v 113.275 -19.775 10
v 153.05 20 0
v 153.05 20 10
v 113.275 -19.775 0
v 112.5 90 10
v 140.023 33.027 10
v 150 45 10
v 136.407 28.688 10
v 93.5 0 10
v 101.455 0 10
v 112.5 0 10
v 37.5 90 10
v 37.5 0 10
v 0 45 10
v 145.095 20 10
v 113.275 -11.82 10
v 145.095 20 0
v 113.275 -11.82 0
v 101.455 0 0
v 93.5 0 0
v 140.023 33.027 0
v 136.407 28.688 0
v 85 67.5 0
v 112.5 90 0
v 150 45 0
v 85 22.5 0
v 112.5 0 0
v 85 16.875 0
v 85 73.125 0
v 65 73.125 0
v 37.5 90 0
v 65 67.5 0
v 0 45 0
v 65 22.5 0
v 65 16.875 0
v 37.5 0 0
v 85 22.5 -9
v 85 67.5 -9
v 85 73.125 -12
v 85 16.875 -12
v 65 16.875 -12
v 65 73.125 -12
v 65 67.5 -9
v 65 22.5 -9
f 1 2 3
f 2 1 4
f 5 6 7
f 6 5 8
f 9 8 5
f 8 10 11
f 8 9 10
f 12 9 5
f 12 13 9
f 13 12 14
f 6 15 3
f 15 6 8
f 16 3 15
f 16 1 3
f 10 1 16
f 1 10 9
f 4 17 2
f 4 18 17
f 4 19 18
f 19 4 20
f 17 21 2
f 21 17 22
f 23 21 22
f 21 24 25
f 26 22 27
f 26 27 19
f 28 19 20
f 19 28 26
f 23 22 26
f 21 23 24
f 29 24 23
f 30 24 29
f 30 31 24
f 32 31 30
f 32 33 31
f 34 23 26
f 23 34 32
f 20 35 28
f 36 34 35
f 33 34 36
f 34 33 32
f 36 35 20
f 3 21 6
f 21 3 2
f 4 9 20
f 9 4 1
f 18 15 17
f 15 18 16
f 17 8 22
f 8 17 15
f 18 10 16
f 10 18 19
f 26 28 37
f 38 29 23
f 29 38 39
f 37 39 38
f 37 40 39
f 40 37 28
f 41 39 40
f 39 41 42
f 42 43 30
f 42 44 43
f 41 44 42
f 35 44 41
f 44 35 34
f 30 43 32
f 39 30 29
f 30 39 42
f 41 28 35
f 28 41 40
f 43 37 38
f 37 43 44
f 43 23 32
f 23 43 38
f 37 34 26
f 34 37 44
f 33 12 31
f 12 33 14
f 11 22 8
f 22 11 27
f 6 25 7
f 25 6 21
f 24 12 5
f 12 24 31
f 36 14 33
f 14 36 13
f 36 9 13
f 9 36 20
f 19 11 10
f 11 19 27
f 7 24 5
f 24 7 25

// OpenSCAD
BELT_LOOP_OPENING = 45;
BUCKLE_LENGTH = 150;
BUCKLE_WIDTH = 90;
BUCKLE_DEPTH = 10;


// Uncomment the part you want to render:
//buckle_front();
buckle_back();
//belt_hole_post();


// buckles
module buckle_front(){
    difference(){
        color("silver"){
            union(){
                // base
                linear_extrude(BUCKLE_DEPTH){
                    polygon(points=[
                        [0,BUCKLE_WIDTH/2],
                        [BUCKLE_LENGTH/4,BUCKLE_WIDTH],
                        [BUCKLE_LENGTH-(BUCKLE_LENGTH/4),BUCKLE_WIDTH],
                        [BUCKLE_LENGTH,BUCKLE_WIDTH/2],
                        [BUCKLE_LENGTH-(BUCKLE_LENGTH/4),0],
                        [BUCKLE_LENGTH/4,0]
                    ]);
                }

                // holster strap loop
                color("silver"){
                    translate([BUCKLE_LENGTH*0.490,20,0]){
                        rotate([0,0,-45]){
                            difference(){
                                cube([BELT_LOOP_OPENING*1.25,BELT_LOOP_OPENING*1.25,BUCKLE_DEPTH]);
                                translate([(BELT_LOOP_OPENING*0.25)/2,(BELT_LOOP_OPENING*0.25)/2,-1]){
                                    cube([BELT_LOOP_OPENING,BELT_LOOP_OPENING,BUCKLE_DEPTH+2]);
                                }
                            }
                        }
                    }
                }
                
                // left "wing"
                translate([-BUCKLE_WIDTH*0.20,BUCKLE_WIDTH*0.40,BUCKLE_DEPTH/2]){
                    rotate([0,0,-10]){
                        color("silver"){
                            cube([BELT_LOOP_OPENING,BUCKLE_WIDTH*0.6,BUCKLE_DEPTH/2]);
                        }
                        color("gray"){
                            translate([BELT_LOOP_OPENING*0.25,(BUCKLE_WIDTH*0.6)*0.25,-BUCKLE_DEPTH/2]){
                                cylinder(r=3,h=BUCKLE_DEPTH/2);
                            }
                            translate([BELT_LOOP_OPENING*0.25,(BUCKLE_WIDTH*0.6)*0.75,-BUCKLE_DEPTH/2]){
                                cylinder(r=3,h=BUCKLE_DEPTH/2);
                            }
                        }
                    }
                }

                // right "wing"
                translate([BUCKLE_WIDTH*1.8,BUCKLE_WIDTH,BUCKLE_DEPTH/2]){
                    rotate([0,0,187]){
                        color("silver"){
                            cube([BELT_LOOP_OPENING,BUCKLE_WIDTH*0.6,BUCKLE_DEPTH/2]);
                        }
                        color("gray"){
                            translate([BELT_LOOP_OPENING*0.25,(BUCKLE_WIDTH*0.6)*0.25,-BUCKLE_DEPTH/2]){
                                cylinder(r=3,h=BUCKLE_DEPTH/2);
                            }
                            translate([BELT_LOOP_OPENING*0.25,(BUCKLE_WIDTH*0.6)*0.75,-BUCKLE_DEPTH/2]){
                                cylinder(r=3,h=BUCKLE_DEPTH/2);
                            }
                        }
                    }
                }                
                
            }
        }
        
        // Holes for belt posts
        translate([BUCKLE_LENGTH*0.1,BUCKLE_WIDTH*0.65,BUCKLE_DEPTH*0.4]){
            belt_hole_post();
        }
        translate([BUCKLE_LENGTH*0.9,BUCKLE_WIDTH*0.65,BUCKLE_DEPTH*0.4]){
            rotate([0,0,180]){
                belt_hole_post();
            }
        }
    }
}

module buckle_back(){
    difference(){
        color("silver"){
            union(){
                // base
                linear_extrude(BUCKLE_DEPTH){
                    polygon(points=[
                        [0,BUCKLE_WIDTH/2],
                        [BUCKLE_LENGTH/4,BUCKLE_WIDTH],
                        [BUCKLE_LENGTH-(BUCKLE_LENGTH/4),BUCKLE_WIDTH],
                        [BUCKLE_LENGTH,BUCKLE_WIDTH/2],
                        [BUCKLE_LENGTH-(BUCKLE_LENGTH/4),0],
                        [BUCKLE_LENGTH/4,0]
                    ]);
                }

                // holster strap loop
                translate([BUCKLE_LENGTH*0.490,20,0]){
                    rotate([0,0,-45]){
                        difference(){
                            cube([BELT_LOOP_OPENING*1.25,BELT_LOOP_OPENING*1.25,BUCKLE_DEPTH]);
                            translate([(BELT_LOOP_OPENING*0.25)/2,(BELT_LOOP_OPENING*0.25)/2,-1]){
                                cube([BELT_LOOP_OPENING,BELT_LOOP_OPENING,BUCKLE_DEPTH+2]);
                            }
                        }
                    }
                }
                
                // belt loop
                loop_height = 12;
                translate([(BUCKLE_LENGTH/2)-(20/2),(BUCKLE_WIDTH/2)-((BELT_LOOP_OPENING*1.25)/2),-loop_height]){
                    difference(){
                        cube([20,BELT_LOOP_OPENING*1.25,loop_height]);
                        translate([-1,(BELT_LOOP_OPENING*1.25)/2-(BELT_LOOP_OPENING/2),3]){
                            cube([22,BELT_LOOP_OPENING,loop_height]);
                        }
                    }
                }
            }
        }
    }
}

// belt post
module belt_hole_post(tolerance=0){
    $fn=25;
    union(){
        base = (4.75+tolerance)/2;
        top = (6+tolerance)/2;
        cylinder(r=base,h=BUCKLE_DEPTH);
        translate([-0.15,0,BUCKLE_DEPTH-1]){
            rotate([0,20,0]){
                cylinder(r1=base,r2=base,h=BUCKLE_DEPTH/2);
            }
        }
    }
}
